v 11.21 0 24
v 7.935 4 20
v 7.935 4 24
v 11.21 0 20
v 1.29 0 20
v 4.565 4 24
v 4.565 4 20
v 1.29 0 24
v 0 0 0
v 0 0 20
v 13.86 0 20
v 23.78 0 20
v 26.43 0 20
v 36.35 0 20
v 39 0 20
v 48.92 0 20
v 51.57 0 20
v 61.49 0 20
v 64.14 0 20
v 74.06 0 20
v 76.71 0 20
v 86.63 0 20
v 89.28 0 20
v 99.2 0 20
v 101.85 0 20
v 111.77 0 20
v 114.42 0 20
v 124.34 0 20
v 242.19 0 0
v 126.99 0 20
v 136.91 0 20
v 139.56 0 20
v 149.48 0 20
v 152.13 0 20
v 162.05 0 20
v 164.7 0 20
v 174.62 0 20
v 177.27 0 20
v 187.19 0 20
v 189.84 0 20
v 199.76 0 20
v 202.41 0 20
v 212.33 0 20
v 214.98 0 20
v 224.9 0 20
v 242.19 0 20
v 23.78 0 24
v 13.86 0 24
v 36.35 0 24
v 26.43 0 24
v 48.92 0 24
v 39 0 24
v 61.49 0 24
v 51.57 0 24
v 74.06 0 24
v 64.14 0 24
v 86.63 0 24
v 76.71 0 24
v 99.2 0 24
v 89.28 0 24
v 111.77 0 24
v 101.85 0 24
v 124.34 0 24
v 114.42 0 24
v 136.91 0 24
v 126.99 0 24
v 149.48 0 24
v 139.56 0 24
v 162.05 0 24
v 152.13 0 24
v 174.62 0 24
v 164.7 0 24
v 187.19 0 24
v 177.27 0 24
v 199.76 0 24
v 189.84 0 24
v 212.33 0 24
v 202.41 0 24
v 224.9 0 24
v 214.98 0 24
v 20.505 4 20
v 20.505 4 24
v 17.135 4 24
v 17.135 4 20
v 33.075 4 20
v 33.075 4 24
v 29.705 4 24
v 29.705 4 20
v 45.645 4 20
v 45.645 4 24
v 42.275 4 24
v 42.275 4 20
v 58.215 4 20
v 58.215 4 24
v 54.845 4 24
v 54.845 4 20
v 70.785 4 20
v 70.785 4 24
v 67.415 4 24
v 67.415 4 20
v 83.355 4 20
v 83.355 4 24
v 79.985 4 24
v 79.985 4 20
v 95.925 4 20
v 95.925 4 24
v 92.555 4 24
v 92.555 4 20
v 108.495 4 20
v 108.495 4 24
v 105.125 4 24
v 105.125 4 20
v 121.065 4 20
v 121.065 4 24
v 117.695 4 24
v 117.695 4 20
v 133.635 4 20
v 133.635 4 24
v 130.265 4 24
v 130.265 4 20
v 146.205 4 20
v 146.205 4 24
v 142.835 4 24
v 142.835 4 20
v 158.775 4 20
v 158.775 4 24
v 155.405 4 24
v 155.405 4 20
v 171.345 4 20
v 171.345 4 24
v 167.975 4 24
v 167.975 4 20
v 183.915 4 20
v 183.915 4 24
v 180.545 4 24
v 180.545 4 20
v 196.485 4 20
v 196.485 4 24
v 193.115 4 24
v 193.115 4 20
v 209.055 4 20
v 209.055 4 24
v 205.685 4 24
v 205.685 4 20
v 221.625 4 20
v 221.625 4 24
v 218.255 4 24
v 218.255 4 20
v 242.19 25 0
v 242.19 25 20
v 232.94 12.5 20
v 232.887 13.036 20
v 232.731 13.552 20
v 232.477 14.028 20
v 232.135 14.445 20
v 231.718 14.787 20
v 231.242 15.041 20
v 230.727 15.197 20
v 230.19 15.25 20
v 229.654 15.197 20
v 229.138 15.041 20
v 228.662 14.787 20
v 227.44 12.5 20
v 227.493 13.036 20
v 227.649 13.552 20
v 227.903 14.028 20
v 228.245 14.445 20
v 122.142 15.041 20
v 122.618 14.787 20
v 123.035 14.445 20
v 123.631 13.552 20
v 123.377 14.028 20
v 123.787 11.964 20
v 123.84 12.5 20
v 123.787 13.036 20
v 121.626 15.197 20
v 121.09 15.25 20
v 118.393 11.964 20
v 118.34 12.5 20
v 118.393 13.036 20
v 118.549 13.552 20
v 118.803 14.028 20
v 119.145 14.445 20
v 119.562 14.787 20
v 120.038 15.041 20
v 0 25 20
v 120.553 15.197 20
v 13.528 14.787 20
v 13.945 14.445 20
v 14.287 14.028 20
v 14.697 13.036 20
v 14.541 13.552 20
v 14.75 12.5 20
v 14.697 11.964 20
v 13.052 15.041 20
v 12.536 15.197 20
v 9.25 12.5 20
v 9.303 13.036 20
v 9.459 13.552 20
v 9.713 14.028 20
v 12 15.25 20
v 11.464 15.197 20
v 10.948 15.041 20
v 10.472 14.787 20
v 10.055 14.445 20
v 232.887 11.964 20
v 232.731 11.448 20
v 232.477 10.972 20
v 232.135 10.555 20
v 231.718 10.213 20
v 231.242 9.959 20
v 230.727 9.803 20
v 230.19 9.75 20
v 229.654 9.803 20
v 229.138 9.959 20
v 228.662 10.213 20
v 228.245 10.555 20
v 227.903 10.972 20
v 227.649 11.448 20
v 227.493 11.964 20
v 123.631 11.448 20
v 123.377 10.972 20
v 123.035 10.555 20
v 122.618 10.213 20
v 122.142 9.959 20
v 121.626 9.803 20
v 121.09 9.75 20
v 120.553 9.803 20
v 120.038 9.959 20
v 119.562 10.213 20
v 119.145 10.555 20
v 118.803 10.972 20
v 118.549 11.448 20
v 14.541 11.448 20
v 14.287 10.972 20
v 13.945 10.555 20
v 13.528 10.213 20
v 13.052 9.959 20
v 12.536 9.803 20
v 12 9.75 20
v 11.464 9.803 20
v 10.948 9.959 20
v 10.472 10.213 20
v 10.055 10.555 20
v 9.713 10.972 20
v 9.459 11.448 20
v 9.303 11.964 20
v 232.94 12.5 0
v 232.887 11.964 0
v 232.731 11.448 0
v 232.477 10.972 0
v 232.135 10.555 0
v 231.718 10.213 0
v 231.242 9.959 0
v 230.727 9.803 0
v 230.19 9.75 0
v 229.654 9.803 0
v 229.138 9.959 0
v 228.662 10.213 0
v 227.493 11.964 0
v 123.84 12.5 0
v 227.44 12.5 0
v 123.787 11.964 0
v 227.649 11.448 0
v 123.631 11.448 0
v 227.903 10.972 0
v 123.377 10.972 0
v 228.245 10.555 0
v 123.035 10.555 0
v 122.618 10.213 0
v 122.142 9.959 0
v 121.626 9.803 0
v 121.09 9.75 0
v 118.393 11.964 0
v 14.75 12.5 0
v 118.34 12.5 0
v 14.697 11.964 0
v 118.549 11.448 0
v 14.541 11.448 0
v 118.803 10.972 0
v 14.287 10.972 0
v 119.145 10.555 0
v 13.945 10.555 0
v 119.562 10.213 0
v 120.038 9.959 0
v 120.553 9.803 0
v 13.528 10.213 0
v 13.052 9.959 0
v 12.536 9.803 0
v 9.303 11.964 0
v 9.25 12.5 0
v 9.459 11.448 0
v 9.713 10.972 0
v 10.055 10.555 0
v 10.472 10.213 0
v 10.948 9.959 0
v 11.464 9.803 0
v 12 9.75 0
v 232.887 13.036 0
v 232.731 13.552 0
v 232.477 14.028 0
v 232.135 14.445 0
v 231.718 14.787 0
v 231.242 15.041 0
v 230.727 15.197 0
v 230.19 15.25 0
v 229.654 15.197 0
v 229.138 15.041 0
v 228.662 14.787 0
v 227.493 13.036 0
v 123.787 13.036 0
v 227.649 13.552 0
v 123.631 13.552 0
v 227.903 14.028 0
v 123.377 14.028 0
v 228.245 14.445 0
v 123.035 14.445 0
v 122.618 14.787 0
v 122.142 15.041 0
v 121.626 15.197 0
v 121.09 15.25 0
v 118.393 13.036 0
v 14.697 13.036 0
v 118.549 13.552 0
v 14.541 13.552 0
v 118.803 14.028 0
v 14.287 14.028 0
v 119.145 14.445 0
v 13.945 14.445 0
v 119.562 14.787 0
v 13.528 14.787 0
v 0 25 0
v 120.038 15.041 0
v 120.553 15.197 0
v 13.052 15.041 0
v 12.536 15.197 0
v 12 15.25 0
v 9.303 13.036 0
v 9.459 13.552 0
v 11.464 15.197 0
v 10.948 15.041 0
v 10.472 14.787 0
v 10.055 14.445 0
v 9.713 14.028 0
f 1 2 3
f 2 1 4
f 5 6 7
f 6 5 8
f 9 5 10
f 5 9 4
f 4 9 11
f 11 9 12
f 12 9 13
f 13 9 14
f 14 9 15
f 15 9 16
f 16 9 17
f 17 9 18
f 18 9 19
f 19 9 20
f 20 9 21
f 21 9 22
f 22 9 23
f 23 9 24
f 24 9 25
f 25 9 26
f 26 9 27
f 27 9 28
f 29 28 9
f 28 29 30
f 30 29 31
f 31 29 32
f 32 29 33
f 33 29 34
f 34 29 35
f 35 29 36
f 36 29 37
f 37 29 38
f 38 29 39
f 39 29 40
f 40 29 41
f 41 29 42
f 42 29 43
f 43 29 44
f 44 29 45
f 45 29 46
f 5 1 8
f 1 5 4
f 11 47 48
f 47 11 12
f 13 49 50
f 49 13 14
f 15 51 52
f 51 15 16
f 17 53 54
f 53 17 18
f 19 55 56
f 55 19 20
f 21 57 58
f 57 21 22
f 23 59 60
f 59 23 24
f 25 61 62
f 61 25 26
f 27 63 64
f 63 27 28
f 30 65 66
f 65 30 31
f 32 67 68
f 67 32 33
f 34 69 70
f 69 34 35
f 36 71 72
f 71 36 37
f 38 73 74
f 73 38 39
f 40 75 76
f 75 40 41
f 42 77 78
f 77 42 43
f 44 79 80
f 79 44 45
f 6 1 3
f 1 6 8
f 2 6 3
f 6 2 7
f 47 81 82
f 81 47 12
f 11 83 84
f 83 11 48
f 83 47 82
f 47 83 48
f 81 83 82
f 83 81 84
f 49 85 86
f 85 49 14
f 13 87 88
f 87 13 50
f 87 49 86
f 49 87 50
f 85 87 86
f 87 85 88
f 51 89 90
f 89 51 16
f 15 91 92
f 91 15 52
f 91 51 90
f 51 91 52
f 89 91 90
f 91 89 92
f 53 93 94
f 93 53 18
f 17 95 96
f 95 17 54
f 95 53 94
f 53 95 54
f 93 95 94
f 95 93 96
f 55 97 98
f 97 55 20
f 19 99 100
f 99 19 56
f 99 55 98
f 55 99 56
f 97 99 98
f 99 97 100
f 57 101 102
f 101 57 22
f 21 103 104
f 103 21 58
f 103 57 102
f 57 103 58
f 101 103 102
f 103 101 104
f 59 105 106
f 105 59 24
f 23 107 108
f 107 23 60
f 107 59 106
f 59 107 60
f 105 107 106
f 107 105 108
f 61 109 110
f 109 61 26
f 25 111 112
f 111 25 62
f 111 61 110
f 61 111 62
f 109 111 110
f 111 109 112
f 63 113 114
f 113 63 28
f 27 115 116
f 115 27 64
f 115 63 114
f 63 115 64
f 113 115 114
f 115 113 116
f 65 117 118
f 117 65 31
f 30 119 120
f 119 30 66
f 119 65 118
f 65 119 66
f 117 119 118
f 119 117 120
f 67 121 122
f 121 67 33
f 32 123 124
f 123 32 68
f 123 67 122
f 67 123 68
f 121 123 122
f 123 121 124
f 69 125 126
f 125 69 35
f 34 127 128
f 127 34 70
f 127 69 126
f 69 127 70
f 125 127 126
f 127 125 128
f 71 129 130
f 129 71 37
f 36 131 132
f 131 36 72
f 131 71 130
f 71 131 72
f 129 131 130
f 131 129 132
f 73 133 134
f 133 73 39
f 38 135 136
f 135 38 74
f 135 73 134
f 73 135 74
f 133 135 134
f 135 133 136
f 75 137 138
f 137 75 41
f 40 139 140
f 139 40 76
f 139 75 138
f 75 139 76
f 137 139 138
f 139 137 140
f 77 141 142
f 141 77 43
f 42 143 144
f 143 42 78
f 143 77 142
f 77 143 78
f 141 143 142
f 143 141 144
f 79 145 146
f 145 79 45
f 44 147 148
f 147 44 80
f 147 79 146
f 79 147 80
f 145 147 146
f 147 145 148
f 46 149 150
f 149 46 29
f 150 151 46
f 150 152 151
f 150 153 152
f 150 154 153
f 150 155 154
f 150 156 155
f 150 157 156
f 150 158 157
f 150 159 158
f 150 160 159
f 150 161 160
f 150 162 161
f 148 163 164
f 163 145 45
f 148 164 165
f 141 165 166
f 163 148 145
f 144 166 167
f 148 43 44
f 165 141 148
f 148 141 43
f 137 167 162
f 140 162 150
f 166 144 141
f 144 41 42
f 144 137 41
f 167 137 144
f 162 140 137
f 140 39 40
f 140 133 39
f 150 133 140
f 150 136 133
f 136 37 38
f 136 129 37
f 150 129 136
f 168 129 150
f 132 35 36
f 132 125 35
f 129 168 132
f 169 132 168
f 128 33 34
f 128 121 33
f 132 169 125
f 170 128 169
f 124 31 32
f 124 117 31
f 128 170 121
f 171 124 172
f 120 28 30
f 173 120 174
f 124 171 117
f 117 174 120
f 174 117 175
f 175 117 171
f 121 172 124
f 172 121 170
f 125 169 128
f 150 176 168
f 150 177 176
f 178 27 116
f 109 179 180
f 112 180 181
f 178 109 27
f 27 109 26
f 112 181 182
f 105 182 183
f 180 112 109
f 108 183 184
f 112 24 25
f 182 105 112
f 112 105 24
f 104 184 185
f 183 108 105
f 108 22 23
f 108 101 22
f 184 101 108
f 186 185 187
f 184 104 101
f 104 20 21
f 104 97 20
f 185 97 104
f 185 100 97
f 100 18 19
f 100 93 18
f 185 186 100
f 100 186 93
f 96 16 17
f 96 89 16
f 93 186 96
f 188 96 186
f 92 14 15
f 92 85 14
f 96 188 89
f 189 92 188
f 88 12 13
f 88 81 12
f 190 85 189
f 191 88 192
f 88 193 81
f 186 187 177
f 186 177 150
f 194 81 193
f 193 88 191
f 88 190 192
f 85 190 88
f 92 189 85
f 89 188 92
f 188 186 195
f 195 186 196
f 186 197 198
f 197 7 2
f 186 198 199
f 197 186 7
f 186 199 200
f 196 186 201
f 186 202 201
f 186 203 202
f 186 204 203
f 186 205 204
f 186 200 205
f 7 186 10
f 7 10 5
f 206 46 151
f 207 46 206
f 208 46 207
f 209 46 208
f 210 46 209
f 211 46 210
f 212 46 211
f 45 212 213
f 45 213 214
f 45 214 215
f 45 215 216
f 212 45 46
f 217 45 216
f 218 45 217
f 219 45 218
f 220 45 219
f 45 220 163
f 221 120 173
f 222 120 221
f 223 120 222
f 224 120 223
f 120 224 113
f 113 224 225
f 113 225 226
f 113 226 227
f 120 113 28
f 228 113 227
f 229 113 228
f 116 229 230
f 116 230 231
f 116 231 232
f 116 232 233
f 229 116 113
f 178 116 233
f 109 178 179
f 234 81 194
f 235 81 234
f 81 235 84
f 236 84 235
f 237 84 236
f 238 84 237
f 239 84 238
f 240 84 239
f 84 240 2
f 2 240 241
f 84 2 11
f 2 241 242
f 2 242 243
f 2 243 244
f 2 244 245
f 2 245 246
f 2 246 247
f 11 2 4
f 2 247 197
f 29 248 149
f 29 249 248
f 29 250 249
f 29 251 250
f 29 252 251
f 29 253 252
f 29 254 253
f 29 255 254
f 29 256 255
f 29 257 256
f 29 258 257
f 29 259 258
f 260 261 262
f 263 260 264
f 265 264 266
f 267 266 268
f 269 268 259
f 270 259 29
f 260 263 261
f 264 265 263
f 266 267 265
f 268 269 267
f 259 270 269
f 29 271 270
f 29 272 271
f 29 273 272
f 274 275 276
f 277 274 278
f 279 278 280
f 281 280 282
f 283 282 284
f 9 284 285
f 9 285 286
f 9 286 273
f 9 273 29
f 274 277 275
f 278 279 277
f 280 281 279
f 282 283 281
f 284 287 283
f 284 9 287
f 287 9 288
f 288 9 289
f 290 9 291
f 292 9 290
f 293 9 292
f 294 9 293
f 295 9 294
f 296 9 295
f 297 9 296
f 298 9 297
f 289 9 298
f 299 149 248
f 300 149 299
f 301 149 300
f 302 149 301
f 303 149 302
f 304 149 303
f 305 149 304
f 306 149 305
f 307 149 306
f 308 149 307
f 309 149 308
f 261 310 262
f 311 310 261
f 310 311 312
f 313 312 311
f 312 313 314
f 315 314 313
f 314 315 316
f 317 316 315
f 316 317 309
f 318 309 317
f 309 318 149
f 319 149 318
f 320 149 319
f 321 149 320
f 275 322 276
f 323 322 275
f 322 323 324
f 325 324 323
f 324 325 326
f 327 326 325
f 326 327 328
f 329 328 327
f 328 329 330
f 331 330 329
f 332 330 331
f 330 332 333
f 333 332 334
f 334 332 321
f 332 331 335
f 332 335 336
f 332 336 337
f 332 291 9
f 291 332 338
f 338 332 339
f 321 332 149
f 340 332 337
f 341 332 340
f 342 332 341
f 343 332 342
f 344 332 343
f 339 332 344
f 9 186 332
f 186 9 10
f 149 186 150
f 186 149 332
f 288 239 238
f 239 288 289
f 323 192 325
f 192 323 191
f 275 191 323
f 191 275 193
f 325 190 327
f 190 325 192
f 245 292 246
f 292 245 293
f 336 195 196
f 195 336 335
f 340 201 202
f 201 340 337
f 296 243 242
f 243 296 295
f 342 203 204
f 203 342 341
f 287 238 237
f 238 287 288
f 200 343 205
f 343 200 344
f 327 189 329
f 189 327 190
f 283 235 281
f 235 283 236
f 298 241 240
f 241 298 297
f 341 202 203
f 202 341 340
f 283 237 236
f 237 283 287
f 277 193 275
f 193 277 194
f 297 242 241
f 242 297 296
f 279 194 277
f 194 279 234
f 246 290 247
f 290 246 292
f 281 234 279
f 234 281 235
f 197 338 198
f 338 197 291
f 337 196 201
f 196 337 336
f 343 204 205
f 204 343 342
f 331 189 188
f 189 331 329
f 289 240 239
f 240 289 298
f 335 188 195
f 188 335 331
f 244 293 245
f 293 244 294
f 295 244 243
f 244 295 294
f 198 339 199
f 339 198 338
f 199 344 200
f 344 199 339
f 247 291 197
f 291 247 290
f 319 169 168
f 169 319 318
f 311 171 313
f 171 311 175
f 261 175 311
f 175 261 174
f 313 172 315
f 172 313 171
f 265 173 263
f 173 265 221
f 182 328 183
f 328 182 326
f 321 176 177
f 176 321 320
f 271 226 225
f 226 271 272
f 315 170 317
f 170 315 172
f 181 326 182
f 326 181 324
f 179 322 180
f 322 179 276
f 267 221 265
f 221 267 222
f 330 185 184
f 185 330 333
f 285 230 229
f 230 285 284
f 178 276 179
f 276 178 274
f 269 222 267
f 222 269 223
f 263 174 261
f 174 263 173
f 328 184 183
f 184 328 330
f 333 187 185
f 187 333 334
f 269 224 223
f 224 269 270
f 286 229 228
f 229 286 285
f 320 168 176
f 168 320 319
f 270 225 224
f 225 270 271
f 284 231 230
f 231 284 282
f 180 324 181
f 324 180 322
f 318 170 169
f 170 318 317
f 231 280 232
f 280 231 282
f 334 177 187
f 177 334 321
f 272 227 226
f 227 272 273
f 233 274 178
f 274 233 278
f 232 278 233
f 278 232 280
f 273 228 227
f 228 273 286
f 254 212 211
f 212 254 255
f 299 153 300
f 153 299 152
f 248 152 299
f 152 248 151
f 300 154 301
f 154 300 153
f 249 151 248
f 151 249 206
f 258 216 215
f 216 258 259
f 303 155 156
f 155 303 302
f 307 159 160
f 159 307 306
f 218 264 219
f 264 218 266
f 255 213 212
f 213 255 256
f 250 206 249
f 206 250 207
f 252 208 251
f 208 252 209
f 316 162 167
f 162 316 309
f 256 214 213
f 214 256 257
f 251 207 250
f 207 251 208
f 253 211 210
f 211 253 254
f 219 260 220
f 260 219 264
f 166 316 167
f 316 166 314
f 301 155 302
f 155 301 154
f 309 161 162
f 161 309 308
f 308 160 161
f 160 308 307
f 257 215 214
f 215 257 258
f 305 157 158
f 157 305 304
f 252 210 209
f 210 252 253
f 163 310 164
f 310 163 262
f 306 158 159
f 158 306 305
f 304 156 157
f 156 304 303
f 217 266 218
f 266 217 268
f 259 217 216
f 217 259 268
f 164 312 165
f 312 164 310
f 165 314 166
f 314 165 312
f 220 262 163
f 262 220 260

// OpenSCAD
$fn = 32;

// ----------------------------------------------------------------------
// Gear rack: m=4 z=18, 242.19 x 25 x 24 mm
// ----------------------------------------------------------------------

// --- parameters (mm) ---
rack_len = 242.19;        // rack length, X
rack_w = 25;              // rack width, Y
rack_h = 24;              // overall height, Z
modul = 4;                // module
body_t = 20;              // tooth root line height
pitch = 12.57;            // circular pitch
tip_w = 3.37;             // tooth thickness at the tip
root_w = 9.92;            // tooth thickness at the root line
hole_d = 5.5;             // mounting hole
sink = 0.6;               // tooth root overlap into the body

tooth_span = 226.19;

module tooth(x0) {
  /* 20 deg flank profile, sunk into the body for a positive overlap */
  translate([x0, 0, body_t - sink])
    linear_extrude(height = rack_h - body_t + sink)
      polygon(points = [[-root_w / 2, 0], [root_w / 2, 0],
                        [tip_w / 2, rack_h - body_t],
                        [-tip_w / 2, rack_h - body_t]]);
}

difference() {
  union() {
    cube([rack_len, rack_w, body_t]);
    for (i = [0 : 18 - 1])
      tooth((i + 0.5) * pitch + (tooth_span - 18 * pitch) / 2);
  }
  translate([12, 12.5, -1]) cylinder(h = body_t + 2, d = hole_d);
  translate([121.09, 12.5, -1]) cylinder(h = body_t + 2, d = hole_d);
  translate([230.19, 12.5, -1]) cylinder(h = body_t + 2, d = hole_d);
}
